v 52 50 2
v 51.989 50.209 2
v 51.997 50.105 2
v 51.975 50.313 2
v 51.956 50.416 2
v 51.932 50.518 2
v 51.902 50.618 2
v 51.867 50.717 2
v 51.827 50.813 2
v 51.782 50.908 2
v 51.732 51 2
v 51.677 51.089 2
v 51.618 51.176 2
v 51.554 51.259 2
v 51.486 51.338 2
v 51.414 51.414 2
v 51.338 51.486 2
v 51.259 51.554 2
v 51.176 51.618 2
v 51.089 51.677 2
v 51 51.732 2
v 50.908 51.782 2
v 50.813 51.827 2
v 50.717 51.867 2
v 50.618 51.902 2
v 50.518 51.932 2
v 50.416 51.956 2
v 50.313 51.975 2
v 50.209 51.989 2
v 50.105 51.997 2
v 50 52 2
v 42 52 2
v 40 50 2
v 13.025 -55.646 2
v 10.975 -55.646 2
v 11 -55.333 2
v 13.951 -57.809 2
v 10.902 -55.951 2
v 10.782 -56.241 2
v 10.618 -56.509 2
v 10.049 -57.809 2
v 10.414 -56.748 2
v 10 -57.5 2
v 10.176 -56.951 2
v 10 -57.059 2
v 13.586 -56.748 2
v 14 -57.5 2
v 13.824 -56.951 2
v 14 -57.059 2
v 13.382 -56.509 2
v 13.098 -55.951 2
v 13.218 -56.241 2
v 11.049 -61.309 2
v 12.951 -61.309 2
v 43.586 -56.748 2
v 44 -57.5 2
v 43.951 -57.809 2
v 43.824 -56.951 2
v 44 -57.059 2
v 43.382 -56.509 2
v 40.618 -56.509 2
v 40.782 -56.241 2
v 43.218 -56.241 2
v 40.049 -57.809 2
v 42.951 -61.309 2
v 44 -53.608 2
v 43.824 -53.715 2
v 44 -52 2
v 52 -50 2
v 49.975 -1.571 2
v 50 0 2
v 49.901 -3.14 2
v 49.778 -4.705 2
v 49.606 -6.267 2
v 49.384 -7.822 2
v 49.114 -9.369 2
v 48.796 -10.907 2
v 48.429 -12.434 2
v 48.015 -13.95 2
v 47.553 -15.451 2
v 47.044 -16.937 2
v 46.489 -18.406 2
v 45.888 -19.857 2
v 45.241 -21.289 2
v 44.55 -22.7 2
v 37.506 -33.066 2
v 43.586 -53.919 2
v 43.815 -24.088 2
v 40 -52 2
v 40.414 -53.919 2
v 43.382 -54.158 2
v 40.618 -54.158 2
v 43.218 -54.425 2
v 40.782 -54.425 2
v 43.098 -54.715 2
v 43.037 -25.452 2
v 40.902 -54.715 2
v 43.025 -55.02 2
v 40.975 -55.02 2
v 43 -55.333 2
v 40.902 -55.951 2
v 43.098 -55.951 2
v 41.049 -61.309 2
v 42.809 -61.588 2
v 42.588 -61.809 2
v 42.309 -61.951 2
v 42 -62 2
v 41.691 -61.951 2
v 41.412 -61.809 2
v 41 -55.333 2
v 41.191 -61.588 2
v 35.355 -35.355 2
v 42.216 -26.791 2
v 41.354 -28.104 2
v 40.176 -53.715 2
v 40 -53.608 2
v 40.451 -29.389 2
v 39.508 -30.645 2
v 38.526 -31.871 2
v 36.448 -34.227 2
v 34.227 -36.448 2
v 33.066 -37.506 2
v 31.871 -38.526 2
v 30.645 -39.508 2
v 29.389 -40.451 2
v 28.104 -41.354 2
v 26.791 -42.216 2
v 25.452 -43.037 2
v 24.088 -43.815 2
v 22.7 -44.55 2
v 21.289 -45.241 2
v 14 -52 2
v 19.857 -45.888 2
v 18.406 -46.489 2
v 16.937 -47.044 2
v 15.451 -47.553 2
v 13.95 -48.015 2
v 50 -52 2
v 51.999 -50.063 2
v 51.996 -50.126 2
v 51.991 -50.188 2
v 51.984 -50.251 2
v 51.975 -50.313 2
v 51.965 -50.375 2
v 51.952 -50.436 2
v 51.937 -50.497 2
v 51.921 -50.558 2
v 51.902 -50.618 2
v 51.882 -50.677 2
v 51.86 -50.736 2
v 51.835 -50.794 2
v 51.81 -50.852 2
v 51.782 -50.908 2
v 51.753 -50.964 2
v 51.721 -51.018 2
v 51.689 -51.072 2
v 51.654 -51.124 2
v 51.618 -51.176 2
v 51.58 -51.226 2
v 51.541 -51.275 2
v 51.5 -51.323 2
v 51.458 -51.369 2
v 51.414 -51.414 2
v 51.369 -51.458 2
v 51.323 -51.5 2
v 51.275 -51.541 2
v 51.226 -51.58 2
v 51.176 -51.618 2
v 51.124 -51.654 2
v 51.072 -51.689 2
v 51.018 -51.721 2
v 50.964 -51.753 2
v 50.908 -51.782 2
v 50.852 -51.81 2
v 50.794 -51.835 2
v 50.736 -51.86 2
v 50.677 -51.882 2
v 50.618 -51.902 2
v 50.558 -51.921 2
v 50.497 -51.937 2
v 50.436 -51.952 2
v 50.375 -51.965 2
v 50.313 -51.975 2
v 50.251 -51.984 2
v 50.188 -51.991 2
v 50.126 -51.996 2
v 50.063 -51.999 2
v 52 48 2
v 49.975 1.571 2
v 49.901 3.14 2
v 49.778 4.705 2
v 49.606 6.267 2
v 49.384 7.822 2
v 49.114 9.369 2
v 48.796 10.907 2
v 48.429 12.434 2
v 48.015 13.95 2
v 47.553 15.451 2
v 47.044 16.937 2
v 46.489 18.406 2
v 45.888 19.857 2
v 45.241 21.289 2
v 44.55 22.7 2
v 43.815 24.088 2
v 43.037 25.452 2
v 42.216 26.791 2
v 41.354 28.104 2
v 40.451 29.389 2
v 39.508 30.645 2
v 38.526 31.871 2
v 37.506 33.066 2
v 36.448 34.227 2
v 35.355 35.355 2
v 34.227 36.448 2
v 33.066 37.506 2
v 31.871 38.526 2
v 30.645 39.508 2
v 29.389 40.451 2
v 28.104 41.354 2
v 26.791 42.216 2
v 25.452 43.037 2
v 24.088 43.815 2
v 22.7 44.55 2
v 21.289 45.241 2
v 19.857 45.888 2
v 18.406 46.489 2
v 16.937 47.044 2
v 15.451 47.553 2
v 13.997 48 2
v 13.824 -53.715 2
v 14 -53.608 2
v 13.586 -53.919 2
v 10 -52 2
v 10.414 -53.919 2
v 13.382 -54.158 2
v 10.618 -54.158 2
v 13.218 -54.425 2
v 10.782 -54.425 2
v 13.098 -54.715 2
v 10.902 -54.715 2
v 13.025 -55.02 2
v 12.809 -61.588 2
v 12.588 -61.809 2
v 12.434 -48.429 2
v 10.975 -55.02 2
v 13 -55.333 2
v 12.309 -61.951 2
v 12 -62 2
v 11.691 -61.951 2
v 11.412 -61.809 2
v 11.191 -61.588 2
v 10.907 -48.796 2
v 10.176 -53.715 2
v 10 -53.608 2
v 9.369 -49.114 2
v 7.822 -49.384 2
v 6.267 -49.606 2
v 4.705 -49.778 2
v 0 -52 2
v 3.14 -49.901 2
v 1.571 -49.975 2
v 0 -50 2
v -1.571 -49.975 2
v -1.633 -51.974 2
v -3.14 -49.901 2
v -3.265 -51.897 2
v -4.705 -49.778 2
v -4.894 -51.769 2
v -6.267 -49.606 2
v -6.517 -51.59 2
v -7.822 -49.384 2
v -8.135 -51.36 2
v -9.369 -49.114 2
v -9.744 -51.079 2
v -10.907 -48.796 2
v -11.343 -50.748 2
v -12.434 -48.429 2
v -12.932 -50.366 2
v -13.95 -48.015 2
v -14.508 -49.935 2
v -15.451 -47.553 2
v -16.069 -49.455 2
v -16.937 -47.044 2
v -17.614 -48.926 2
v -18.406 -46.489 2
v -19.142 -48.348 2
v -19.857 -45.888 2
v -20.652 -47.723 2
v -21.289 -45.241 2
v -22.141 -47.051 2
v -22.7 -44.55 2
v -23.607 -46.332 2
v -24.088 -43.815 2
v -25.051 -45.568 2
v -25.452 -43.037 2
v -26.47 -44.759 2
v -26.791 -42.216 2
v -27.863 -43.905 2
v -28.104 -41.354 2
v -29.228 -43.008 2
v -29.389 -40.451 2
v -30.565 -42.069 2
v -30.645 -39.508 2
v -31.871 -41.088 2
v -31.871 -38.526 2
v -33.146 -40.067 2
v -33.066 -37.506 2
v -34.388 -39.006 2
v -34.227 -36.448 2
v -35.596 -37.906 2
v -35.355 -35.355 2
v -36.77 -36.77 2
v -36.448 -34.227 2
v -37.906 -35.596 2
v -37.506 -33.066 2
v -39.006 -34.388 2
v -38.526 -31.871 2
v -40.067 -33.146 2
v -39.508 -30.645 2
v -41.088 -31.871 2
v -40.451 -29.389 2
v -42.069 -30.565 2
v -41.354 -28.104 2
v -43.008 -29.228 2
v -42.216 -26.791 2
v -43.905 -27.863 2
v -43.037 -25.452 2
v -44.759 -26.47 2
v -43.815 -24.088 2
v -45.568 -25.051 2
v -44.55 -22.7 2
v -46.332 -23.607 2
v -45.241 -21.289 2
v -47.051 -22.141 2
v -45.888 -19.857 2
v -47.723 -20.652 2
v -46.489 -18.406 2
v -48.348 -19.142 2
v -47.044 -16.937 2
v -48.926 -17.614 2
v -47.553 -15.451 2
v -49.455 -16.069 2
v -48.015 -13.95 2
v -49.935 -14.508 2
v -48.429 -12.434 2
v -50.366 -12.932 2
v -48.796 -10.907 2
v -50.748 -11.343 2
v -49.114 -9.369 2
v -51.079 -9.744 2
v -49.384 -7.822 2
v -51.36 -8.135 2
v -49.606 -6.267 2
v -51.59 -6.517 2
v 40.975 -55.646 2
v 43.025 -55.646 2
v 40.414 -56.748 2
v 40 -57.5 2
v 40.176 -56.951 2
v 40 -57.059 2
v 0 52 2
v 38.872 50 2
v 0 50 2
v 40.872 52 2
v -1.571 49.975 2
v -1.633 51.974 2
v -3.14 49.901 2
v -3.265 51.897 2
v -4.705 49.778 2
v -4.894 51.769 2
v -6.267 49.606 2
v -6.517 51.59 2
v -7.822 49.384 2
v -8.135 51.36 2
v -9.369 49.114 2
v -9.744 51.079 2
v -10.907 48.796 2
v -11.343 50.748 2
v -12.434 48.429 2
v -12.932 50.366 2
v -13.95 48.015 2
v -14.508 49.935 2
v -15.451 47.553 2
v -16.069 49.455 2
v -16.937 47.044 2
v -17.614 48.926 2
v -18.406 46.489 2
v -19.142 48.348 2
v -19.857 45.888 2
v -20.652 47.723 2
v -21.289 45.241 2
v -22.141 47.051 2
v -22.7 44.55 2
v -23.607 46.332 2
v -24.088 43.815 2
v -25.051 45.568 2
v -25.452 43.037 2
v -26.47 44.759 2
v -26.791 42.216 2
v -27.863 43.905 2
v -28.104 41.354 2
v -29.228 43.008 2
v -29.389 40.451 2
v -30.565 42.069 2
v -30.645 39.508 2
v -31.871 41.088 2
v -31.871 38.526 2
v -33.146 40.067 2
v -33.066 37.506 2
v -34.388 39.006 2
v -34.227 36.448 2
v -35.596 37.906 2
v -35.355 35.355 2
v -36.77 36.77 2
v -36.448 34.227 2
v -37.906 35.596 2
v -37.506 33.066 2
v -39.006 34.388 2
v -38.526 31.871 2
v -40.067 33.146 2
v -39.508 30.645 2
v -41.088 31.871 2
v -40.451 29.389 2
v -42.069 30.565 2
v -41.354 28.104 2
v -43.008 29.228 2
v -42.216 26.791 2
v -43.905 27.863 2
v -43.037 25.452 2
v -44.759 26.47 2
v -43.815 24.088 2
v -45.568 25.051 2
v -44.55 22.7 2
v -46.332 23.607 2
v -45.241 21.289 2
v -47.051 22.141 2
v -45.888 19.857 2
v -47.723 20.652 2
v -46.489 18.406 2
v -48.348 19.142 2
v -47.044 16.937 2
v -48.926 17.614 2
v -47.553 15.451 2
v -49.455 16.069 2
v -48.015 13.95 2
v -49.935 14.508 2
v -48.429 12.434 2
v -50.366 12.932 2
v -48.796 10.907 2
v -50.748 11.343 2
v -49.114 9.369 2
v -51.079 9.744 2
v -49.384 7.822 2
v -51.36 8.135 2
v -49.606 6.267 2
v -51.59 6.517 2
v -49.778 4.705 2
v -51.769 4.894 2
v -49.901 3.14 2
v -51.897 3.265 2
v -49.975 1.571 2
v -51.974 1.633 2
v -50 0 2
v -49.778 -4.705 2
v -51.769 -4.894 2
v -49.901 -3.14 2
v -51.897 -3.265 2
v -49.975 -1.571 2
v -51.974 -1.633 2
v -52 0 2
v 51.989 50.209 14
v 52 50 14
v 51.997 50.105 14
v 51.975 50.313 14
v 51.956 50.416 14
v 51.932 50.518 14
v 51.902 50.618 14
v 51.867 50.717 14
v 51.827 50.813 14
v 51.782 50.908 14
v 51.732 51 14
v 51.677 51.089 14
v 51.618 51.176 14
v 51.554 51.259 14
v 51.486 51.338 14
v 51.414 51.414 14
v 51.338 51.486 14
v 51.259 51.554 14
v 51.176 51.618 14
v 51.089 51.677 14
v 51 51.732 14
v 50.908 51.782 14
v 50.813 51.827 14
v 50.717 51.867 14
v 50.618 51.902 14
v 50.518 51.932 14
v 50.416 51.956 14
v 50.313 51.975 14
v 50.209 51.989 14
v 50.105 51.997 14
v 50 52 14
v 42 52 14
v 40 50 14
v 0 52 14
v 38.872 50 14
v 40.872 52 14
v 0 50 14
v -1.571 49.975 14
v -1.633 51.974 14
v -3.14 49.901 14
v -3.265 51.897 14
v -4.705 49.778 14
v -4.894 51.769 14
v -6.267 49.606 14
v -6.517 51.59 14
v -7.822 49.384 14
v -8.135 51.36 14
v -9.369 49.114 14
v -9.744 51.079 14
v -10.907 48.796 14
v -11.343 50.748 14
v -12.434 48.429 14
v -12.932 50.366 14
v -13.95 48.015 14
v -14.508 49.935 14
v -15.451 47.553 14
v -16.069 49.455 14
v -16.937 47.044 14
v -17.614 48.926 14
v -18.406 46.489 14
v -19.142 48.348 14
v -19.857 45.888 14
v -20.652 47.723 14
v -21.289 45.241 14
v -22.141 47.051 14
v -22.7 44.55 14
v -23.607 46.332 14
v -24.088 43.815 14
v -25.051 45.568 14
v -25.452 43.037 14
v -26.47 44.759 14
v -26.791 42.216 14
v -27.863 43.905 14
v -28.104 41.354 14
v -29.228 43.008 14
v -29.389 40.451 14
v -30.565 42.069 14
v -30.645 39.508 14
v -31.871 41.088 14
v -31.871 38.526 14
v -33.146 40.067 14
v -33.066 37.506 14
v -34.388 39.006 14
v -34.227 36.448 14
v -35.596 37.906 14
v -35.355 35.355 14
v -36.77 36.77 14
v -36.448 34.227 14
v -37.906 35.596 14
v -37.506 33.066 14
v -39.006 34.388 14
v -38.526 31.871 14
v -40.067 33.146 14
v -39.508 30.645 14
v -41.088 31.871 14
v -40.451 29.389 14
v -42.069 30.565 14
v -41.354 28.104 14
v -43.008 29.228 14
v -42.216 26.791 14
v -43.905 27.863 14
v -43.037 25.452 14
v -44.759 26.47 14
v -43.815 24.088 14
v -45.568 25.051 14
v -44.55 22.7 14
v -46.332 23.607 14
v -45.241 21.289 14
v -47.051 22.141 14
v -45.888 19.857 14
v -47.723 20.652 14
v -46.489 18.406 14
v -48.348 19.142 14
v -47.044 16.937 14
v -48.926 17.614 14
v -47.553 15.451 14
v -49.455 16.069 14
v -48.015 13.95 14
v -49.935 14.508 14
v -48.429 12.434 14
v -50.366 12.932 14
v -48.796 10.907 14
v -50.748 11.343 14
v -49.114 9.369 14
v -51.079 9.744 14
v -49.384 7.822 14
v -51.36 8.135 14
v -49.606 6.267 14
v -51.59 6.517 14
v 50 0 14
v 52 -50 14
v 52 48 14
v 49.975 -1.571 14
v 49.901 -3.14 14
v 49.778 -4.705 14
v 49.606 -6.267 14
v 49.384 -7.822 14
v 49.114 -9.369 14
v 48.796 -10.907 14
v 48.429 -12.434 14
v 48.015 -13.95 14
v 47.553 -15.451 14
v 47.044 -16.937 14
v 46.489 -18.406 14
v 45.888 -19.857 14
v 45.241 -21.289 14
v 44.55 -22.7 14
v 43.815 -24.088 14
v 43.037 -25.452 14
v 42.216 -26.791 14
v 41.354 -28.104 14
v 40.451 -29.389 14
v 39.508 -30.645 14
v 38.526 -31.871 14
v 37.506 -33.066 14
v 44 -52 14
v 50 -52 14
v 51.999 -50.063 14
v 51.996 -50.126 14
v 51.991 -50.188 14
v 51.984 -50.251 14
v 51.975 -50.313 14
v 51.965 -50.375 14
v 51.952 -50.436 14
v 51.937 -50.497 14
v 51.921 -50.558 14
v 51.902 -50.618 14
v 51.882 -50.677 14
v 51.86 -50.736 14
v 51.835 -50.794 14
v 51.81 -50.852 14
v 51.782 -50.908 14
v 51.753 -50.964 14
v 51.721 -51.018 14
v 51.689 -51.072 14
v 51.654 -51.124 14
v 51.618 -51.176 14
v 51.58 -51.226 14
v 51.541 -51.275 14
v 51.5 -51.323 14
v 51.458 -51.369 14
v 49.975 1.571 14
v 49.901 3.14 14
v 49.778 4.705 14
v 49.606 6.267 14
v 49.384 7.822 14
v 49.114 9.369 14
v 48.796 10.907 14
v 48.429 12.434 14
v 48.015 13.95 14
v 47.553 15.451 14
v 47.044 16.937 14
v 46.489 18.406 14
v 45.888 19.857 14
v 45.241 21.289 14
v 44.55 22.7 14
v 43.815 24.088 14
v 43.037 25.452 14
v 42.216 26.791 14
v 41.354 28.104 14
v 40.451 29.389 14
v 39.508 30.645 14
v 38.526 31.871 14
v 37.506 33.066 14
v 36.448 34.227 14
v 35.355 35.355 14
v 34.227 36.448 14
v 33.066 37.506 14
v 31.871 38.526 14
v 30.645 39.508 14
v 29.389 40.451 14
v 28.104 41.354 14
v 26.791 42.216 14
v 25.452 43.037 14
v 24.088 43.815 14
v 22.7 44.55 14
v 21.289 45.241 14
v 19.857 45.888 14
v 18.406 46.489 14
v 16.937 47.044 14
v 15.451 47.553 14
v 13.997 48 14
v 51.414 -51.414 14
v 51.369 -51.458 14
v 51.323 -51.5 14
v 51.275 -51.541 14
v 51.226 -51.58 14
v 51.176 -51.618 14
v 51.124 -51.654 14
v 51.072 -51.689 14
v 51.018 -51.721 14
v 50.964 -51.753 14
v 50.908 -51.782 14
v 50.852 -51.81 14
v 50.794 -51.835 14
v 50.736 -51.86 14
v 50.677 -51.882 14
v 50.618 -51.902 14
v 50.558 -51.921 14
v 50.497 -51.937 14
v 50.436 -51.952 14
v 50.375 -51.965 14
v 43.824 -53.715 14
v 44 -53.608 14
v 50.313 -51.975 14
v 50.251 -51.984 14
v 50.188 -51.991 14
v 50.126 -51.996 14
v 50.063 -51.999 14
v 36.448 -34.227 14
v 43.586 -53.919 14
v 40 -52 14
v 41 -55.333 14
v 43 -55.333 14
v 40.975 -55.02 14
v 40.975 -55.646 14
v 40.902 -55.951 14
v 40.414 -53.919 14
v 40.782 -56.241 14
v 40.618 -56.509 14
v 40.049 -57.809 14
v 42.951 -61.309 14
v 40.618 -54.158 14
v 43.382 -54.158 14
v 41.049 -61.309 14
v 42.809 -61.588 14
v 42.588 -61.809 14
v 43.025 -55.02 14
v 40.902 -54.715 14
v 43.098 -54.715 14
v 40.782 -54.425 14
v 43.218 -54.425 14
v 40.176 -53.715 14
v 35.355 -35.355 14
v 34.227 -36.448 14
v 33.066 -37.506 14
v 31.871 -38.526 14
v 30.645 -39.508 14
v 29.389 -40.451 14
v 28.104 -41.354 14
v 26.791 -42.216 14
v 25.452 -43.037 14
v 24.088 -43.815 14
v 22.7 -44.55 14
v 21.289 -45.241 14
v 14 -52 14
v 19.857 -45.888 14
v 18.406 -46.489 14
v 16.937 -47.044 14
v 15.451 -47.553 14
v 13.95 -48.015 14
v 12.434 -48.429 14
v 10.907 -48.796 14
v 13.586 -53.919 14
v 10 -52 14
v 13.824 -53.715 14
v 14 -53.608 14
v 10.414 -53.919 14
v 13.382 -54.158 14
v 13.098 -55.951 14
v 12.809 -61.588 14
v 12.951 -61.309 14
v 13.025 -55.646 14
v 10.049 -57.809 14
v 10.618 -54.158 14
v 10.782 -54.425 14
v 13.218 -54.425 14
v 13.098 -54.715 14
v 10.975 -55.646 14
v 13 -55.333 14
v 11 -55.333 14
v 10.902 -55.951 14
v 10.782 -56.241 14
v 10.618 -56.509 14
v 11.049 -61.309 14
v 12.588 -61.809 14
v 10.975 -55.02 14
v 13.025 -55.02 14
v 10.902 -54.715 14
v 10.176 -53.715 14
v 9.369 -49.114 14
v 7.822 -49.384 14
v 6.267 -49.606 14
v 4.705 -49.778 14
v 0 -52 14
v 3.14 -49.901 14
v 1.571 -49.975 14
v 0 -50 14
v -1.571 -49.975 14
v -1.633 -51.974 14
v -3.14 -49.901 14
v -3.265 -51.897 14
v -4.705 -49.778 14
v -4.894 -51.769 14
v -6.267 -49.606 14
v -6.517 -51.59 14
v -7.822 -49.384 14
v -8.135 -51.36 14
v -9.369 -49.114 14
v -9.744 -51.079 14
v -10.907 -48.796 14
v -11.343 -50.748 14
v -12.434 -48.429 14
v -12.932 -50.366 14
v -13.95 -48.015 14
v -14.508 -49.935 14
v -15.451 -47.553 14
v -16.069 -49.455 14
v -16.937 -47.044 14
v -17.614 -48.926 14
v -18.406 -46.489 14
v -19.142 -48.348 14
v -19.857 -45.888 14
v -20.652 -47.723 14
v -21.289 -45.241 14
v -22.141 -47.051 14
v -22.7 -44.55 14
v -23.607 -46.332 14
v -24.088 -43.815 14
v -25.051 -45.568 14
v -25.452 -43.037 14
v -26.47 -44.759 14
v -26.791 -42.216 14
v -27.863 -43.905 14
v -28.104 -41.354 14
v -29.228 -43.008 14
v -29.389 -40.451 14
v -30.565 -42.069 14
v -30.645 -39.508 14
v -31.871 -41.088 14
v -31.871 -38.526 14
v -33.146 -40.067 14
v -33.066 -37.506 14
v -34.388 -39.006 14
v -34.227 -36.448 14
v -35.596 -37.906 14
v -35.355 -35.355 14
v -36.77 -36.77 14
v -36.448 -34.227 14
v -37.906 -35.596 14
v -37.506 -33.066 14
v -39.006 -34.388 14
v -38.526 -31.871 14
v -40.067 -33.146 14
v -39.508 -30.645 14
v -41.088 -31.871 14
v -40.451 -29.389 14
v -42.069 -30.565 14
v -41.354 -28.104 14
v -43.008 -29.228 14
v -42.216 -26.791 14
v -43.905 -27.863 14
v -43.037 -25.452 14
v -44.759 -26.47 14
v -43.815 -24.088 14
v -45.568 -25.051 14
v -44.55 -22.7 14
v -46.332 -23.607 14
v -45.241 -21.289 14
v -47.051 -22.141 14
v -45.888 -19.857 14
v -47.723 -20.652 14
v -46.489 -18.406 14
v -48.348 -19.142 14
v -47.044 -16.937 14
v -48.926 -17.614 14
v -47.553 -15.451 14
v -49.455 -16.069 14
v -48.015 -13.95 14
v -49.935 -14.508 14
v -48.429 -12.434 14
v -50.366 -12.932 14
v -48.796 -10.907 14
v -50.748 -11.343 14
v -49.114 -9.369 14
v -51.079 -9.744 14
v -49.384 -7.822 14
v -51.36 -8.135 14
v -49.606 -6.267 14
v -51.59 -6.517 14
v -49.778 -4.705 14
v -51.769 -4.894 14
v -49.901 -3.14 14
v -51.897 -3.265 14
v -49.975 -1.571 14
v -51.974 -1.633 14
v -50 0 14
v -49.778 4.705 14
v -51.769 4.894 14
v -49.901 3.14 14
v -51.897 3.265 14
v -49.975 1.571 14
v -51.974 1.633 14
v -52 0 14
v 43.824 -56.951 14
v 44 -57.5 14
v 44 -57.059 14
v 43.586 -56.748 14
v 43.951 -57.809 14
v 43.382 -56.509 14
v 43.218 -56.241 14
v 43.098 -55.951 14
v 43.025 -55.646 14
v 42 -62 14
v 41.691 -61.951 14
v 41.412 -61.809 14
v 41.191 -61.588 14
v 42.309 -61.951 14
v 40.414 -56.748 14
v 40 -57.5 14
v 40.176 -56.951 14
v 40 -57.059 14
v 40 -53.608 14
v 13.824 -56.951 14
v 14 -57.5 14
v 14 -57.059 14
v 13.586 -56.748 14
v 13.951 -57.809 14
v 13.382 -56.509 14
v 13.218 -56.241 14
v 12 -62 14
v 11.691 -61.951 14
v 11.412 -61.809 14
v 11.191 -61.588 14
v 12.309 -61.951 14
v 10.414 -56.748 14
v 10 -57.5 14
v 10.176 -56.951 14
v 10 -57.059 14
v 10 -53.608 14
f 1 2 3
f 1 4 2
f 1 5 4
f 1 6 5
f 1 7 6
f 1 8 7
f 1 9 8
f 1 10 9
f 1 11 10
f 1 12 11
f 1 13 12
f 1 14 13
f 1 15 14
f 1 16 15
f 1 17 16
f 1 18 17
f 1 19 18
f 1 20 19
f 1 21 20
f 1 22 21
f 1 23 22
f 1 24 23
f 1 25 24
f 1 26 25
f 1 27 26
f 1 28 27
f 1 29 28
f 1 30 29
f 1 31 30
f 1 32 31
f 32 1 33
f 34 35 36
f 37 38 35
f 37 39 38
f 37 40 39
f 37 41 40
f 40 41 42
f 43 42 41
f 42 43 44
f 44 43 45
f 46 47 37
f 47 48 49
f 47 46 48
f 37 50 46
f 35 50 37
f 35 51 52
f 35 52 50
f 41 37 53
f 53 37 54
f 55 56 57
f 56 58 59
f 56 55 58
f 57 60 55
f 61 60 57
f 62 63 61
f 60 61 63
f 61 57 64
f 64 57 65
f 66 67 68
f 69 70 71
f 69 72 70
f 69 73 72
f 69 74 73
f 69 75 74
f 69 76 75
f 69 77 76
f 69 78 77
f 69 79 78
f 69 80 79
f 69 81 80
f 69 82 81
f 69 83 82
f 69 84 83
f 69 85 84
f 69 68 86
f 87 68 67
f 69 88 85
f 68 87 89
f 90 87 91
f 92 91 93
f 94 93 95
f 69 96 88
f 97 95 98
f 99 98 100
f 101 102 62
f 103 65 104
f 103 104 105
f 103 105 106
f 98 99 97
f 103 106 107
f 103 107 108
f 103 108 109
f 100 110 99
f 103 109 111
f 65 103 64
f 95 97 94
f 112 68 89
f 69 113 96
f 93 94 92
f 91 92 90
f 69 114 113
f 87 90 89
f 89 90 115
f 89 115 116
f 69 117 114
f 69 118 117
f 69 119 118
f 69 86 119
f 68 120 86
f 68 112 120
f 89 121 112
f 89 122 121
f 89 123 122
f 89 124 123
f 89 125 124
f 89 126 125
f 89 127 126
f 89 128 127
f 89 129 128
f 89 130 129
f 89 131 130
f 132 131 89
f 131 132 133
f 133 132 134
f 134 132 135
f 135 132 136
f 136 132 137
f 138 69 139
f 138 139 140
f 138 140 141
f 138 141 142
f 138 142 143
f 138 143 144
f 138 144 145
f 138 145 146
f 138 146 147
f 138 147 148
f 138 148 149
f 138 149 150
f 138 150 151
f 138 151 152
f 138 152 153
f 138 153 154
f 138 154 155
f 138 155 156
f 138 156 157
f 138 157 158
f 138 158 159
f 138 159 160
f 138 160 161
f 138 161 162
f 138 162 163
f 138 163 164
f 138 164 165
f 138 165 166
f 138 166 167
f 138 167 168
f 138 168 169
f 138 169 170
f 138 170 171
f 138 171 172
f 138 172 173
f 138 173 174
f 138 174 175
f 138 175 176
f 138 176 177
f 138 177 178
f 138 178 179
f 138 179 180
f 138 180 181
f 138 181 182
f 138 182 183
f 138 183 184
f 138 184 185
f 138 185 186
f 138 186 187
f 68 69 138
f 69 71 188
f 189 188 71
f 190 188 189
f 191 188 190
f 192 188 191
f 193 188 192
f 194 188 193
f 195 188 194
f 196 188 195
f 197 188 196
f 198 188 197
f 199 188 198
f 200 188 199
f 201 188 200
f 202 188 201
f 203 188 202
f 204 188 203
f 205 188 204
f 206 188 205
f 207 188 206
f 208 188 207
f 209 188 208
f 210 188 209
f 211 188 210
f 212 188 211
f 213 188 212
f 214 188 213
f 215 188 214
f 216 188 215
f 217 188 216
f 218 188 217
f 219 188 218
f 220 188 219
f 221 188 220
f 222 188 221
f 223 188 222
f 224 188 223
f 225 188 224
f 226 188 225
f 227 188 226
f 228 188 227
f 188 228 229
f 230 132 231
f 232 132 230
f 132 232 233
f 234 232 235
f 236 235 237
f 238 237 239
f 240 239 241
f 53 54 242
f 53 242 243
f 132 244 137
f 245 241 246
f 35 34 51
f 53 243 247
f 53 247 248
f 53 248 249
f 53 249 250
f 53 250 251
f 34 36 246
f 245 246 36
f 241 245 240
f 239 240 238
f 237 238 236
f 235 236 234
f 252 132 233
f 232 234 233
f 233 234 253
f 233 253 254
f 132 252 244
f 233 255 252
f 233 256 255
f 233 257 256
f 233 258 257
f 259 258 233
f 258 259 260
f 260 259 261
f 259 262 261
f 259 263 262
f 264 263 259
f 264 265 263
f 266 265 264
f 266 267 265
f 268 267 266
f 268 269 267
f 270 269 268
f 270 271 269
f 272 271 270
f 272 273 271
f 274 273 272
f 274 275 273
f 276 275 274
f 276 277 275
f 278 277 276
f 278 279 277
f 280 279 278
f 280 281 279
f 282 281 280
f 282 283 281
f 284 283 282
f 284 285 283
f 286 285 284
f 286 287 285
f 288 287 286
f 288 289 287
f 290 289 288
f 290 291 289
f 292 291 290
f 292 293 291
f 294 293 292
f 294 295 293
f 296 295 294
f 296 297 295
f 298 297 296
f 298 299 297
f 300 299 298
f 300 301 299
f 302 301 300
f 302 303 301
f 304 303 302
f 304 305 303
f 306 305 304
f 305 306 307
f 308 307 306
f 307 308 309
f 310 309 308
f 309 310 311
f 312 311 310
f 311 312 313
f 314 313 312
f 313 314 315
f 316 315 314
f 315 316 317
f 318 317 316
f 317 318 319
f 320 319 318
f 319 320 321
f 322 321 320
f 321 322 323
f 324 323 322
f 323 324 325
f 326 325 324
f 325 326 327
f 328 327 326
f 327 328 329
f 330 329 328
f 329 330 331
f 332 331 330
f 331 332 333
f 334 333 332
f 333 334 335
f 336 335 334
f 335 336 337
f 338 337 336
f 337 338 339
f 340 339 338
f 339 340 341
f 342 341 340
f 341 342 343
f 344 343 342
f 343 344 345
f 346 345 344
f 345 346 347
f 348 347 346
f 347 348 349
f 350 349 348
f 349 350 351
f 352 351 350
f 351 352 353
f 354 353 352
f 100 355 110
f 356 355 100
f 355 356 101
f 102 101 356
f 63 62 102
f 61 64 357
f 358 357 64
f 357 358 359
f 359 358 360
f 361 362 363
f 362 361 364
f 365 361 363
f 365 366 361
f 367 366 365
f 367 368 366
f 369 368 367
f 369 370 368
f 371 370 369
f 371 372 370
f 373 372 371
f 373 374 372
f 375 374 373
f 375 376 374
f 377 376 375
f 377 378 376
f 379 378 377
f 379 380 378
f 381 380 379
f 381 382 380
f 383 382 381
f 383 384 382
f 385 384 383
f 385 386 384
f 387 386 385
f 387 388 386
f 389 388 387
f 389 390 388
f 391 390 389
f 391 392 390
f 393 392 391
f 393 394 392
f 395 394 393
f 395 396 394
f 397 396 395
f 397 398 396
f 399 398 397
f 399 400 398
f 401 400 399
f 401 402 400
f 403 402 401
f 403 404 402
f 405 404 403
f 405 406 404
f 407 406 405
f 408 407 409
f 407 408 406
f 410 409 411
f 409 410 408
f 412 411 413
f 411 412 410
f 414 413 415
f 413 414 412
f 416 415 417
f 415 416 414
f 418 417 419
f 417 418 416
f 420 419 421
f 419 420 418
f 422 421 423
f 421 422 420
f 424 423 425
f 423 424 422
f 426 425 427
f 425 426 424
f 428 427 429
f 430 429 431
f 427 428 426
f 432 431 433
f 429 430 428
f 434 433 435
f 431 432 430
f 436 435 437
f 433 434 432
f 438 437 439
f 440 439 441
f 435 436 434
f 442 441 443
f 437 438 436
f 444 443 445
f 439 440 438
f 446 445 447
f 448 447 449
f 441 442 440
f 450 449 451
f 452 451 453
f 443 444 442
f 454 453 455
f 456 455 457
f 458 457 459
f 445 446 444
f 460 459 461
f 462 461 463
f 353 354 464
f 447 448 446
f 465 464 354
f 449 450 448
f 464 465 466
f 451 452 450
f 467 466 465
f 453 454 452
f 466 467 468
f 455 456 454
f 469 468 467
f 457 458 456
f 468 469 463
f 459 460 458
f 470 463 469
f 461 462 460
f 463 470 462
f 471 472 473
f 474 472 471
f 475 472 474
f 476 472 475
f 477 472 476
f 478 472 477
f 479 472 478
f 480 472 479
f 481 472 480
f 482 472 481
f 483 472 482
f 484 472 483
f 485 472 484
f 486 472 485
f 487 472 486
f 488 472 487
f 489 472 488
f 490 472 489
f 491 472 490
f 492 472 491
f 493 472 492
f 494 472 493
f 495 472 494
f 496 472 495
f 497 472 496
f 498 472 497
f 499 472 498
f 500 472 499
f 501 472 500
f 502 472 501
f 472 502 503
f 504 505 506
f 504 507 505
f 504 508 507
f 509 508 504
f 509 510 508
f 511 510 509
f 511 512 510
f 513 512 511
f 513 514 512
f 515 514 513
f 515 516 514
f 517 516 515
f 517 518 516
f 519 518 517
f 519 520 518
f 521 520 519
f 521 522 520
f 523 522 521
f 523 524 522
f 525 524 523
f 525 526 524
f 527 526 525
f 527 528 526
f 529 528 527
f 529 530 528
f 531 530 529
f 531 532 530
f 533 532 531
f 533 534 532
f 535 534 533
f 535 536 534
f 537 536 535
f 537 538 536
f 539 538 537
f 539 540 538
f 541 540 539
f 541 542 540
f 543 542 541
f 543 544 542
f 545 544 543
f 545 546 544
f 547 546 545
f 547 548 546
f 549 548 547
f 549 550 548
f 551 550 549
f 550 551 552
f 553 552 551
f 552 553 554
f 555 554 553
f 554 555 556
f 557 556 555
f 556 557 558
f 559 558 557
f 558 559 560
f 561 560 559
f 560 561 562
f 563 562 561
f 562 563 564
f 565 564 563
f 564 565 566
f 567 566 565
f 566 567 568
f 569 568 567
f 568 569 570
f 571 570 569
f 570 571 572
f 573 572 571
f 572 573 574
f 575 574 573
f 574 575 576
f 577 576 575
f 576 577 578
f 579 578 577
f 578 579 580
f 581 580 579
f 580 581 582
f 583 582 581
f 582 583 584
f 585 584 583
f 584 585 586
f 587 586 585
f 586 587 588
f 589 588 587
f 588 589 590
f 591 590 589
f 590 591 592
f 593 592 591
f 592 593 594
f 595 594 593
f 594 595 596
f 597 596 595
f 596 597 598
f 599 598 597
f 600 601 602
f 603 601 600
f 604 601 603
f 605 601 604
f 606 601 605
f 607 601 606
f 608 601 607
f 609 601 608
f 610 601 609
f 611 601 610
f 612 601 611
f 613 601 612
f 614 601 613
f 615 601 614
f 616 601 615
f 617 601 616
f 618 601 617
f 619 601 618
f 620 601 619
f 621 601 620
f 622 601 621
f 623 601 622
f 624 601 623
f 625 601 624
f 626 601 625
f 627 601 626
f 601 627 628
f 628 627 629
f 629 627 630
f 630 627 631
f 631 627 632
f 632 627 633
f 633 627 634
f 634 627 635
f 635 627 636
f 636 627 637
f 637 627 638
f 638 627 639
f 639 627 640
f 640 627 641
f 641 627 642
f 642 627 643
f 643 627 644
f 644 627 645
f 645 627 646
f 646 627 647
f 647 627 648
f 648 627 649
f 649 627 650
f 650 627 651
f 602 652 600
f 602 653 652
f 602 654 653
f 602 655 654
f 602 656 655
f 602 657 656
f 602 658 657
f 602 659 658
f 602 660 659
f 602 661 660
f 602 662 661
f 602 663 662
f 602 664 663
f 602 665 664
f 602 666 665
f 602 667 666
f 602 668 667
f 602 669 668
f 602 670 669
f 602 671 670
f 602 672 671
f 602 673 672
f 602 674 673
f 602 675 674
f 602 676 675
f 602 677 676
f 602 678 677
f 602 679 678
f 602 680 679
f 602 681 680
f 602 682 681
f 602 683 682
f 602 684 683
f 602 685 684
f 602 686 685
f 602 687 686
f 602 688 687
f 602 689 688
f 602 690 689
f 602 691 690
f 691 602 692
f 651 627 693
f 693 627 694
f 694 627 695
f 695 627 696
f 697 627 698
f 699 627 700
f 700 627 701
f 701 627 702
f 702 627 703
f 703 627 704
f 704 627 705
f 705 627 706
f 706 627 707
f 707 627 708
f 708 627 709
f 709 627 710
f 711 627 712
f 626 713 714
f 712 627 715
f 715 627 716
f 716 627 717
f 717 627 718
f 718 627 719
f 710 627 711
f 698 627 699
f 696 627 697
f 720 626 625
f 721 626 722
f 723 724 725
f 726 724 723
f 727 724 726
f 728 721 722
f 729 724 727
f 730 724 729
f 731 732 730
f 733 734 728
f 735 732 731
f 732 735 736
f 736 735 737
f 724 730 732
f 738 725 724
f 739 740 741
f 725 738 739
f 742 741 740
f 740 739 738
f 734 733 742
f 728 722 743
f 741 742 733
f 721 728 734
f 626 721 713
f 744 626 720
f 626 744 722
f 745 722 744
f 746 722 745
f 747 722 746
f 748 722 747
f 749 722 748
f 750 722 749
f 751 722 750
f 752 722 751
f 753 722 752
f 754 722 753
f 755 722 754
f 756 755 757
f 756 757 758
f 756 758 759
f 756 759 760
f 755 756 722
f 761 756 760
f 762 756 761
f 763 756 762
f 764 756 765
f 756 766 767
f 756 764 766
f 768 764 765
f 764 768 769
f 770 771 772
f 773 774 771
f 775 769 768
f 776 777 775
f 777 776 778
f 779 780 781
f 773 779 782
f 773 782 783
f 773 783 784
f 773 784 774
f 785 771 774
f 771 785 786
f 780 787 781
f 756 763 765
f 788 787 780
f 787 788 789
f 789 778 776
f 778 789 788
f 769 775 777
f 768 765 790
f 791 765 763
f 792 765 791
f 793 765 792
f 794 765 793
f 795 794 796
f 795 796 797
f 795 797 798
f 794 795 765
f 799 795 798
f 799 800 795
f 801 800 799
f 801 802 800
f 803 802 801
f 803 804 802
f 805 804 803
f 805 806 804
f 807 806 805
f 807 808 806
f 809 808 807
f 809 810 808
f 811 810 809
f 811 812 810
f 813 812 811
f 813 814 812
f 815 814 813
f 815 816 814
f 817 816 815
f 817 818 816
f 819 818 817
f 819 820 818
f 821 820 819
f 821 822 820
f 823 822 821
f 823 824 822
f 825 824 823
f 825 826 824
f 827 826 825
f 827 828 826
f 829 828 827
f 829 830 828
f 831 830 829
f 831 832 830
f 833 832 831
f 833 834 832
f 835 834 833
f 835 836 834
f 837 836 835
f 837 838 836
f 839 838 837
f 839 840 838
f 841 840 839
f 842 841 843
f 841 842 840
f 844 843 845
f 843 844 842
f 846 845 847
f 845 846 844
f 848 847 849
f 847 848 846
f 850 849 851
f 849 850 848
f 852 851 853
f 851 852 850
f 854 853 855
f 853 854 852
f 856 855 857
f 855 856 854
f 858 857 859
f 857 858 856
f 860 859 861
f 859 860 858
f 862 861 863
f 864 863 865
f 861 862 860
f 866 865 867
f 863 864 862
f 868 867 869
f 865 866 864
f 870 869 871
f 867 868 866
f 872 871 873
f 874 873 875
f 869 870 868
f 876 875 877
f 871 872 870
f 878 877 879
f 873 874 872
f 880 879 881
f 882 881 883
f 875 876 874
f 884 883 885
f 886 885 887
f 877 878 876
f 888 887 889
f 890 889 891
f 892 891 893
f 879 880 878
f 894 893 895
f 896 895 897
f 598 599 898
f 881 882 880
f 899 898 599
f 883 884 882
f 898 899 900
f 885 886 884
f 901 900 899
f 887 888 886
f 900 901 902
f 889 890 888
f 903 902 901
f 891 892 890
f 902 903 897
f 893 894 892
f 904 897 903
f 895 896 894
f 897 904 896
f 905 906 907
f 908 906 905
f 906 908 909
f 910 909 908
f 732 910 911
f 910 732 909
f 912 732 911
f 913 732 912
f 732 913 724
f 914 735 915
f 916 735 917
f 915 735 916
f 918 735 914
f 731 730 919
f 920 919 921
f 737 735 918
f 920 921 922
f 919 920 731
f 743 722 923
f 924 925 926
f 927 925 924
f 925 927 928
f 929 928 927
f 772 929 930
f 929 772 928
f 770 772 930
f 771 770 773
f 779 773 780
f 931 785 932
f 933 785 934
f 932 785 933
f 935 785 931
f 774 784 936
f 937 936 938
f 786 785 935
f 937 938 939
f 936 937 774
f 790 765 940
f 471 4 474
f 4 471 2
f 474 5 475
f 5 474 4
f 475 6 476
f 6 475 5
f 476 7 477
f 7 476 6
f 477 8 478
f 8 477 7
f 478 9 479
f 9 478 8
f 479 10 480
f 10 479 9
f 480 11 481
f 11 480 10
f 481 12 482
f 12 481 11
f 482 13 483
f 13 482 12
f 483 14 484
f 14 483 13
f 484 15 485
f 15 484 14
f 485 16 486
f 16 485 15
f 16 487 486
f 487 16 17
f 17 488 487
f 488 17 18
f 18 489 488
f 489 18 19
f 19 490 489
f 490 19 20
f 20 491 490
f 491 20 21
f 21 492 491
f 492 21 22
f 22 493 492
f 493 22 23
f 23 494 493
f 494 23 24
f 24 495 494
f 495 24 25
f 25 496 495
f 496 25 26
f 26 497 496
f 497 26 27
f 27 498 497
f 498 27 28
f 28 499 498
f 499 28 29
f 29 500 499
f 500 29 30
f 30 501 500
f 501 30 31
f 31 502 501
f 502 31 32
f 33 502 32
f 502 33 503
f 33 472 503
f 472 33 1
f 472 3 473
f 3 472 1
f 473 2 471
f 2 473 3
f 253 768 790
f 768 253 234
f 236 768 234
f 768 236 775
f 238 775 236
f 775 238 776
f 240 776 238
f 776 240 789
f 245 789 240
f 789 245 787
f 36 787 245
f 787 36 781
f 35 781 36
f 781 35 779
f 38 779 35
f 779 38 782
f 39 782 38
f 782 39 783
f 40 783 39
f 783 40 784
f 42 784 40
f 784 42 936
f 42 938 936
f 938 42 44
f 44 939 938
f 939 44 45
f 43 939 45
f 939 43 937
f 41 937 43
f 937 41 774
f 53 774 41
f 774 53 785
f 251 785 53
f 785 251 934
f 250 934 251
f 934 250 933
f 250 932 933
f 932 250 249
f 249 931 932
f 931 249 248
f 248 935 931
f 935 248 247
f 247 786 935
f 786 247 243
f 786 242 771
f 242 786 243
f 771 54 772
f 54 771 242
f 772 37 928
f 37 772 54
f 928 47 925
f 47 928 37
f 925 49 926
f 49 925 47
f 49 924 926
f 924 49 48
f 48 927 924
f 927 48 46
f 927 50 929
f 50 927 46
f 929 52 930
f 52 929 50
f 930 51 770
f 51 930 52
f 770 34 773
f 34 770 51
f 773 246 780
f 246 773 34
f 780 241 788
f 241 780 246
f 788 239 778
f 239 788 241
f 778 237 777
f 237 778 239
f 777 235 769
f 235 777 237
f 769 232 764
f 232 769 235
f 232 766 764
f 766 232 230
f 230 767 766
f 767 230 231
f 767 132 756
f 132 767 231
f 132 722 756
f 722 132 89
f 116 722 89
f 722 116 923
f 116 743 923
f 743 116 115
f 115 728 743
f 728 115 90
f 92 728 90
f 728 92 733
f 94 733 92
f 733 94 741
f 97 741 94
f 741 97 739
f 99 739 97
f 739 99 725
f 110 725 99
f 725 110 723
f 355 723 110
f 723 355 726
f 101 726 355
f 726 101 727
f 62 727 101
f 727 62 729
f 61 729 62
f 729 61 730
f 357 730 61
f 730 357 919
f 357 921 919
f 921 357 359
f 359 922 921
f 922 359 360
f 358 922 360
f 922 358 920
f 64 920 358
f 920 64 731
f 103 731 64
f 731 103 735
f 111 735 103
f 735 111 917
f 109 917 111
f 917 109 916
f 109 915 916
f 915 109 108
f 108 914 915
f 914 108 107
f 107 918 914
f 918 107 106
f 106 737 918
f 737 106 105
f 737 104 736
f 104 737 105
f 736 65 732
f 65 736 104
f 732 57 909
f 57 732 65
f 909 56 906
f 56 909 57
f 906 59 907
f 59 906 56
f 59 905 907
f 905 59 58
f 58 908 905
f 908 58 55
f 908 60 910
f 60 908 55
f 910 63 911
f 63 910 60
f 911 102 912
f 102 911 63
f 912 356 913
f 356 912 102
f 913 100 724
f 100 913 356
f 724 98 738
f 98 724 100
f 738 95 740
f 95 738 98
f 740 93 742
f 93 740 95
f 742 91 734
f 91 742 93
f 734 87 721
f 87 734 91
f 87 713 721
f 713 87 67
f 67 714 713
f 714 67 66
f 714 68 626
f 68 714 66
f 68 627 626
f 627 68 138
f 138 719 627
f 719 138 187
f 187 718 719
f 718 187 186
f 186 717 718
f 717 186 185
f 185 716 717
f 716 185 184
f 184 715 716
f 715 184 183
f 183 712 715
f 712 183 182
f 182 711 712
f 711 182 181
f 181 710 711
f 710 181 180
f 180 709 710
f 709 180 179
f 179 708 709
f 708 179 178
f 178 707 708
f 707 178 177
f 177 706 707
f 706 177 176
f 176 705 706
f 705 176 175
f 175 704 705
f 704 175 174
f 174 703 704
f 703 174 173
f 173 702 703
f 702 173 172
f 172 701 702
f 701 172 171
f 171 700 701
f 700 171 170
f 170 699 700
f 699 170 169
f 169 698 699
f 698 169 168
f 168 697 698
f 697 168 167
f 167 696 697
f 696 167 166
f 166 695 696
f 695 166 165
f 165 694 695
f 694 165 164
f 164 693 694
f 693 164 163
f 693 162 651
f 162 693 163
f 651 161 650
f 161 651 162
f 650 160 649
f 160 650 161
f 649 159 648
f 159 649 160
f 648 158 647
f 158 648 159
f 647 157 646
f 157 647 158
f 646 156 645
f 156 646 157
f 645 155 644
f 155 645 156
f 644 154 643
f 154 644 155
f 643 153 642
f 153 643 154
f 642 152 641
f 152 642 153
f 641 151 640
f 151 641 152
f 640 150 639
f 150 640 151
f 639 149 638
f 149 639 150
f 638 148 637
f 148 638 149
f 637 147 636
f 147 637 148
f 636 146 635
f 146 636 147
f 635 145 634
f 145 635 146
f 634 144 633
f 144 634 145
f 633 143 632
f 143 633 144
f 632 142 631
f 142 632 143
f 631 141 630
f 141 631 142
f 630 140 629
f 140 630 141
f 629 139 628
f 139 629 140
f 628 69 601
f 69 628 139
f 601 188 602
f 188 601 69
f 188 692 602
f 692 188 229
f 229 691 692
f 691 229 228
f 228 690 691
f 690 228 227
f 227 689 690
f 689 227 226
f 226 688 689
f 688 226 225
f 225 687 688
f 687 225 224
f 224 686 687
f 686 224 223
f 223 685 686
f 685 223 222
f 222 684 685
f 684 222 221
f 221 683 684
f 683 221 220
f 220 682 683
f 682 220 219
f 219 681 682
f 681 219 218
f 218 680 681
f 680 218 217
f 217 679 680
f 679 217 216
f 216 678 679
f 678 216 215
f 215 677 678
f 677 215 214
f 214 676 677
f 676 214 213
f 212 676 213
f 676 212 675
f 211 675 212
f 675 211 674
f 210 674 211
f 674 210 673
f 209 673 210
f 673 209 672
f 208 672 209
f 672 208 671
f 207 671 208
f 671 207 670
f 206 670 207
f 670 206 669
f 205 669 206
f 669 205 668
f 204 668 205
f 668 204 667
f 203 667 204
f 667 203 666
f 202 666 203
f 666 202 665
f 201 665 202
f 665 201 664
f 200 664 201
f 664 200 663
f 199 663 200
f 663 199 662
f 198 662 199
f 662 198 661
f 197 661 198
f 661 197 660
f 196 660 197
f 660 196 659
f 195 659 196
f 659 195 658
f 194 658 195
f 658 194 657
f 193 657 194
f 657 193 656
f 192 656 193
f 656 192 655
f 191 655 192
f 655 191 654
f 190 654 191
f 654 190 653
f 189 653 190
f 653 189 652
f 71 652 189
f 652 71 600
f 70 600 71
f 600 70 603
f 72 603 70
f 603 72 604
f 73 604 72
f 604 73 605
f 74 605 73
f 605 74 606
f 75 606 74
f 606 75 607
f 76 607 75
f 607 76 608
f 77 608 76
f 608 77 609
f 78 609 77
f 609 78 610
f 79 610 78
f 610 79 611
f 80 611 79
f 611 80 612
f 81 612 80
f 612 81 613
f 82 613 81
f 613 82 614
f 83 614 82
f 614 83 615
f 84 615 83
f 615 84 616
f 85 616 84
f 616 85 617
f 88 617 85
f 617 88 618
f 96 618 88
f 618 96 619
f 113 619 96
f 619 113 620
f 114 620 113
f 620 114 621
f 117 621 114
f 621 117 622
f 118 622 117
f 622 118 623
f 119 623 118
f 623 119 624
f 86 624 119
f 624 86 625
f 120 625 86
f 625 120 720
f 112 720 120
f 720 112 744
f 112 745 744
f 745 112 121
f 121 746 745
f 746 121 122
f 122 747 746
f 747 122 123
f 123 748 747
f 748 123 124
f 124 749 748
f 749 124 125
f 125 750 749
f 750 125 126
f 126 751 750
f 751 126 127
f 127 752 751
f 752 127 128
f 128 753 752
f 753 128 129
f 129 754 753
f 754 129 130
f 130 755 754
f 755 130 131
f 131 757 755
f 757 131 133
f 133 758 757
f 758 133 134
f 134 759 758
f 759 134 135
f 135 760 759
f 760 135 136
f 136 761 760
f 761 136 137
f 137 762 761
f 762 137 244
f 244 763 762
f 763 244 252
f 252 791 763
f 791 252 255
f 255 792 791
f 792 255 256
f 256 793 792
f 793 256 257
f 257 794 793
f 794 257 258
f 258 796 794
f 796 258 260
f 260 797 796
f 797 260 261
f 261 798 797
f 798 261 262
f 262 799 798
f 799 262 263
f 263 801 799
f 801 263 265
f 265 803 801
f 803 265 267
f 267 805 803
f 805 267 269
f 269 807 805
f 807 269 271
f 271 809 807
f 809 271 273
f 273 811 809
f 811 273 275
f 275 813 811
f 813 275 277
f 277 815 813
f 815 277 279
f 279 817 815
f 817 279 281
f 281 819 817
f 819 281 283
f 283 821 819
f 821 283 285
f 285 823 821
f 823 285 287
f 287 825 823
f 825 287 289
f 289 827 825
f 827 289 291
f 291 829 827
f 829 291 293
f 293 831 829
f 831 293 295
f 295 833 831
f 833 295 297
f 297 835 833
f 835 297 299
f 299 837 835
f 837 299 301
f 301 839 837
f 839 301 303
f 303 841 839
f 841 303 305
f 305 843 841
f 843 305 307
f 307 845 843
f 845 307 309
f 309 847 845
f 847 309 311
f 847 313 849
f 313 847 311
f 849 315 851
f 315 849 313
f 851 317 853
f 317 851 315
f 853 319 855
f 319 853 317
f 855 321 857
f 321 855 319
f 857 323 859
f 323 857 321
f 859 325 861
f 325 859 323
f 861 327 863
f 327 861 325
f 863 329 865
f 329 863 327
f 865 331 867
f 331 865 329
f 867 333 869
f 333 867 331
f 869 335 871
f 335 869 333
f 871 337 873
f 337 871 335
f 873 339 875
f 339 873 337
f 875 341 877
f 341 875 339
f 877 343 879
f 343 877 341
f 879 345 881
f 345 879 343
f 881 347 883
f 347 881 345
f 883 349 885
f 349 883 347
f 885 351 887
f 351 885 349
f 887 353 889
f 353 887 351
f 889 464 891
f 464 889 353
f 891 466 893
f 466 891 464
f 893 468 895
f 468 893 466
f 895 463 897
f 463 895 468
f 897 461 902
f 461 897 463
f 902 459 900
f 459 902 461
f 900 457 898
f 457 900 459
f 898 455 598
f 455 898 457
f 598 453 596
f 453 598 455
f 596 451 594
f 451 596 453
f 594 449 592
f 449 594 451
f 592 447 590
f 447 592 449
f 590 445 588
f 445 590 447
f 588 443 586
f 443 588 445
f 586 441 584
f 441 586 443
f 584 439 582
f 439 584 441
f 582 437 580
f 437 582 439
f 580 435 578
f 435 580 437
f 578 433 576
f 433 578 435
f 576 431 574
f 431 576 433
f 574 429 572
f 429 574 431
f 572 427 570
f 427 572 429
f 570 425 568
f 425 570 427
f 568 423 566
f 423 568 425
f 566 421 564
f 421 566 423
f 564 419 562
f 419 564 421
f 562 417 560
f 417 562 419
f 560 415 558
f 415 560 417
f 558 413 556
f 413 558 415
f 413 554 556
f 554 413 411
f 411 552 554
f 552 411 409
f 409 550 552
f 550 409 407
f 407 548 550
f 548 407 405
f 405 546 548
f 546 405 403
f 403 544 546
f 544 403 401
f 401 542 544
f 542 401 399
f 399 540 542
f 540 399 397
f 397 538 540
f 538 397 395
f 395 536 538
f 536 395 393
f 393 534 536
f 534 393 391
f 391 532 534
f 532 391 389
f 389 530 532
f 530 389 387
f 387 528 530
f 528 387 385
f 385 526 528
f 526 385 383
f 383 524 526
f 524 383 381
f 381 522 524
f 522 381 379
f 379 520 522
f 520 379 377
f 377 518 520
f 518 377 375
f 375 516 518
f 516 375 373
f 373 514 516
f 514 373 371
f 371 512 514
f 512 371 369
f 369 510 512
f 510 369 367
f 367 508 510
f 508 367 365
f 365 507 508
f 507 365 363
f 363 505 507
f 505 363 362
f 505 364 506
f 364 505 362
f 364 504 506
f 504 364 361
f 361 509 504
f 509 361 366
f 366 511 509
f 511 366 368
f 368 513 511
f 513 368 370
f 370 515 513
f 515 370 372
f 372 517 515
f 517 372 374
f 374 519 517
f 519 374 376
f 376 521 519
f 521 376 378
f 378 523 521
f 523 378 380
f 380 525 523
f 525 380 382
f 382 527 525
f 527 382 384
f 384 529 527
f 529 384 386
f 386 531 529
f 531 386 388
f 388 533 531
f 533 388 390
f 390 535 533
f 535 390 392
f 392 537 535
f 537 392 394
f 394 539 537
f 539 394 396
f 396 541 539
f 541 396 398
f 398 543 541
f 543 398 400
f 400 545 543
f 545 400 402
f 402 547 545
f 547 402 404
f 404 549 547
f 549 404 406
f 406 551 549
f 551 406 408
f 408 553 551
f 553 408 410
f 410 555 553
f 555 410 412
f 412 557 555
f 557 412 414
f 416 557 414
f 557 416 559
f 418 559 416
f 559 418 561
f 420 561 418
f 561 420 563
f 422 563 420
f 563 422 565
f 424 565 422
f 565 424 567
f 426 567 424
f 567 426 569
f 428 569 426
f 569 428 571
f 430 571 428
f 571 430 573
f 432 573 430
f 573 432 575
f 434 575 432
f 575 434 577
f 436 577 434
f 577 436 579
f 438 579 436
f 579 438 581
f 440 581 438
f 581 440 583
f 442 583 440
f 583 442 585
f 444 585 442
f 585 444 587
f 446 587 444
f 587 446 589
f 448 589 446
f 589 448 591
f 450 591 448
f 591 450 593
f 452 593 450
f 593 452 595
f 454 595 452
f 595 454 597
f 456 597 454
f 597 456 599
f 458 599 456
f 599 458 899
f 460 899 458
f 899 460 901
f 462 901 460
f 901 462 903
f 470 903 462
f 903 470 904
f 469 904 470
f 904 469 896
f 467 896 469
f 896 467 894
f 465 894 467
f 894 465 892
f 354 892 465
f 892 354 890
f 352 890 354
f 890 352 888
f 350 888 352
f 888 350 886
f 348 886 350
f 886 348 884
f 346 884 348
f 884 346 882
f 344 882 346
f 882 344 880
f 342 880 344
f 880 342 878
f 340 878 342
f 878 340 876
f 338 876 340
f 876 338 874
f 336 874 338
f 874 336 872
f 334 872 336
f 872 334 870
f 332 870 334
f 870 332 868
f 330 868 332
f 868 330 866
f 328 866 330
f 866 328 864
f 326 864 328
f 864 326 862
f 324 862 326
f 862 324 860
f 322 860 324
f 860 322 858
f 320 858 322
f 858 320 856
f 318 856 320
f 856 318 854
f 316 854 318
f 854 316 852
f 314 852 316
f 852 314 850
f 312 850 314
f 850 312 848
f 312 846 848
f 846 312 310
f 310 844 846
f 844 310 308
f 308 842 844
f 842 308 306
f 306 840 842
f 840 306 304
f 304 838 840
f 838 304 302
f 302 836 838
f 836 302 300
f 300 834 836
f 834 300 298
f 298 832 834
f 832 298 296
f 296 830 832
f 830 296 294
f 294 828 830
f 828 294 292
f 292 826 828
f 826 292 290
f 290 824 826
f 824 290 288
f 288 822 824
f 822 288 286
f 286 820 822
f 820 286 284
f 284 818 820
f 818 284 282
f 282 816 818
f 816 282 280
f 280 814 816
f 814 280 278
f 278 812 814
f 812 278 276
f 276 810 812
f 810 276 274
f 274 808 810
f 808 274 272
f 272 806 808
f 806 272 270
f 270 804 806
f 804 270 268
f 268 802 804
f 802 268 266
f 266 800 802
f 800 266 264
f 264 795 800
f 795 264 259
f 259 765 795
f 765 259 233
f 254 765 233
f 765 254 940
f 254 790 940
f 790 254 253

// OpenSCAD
/*
User defined variables:
*/

cfgStripDiameter = 100;
cStripWidth = 10;
cStripThickness = 2;

//internal tweak variables
cWallThickness = 2;
cReflectorOffset = 10;
cReflectorHole = 0.8;
cFilletRadius=2;
cStripWidthClearance = 2;

cClampBiasFromFront = 10;
cClampsDistance = 30;

Square_size = cfgStripDiameter + cWallThickness*2;
//square(size = [Square_size,Square_size], center = true);
cFrontEdge = cfgStripDiameter/2 + cWallThickness;
cTopEdge = cfgStripDiameter/2 + cWallThickness;
cBottomEdge = -cTopEdge;

module base_internals() {
hull($fn=200) {
RadiusCenterOffset = Square_size/2 - cFilletRadius;
translate([RadiusCenterOffset,RadiusCenterOffset])
circle(r=cFilletRadius,$fn=120);
translate([RadiusCenterOffset,-RadiusCenterOffset])
circle(r=cFilletRadius);

circle(d=cfgStripDiameter+cWallThickness*2, $fn=200);
}    
}

//Clamp parameters
cClampRadius = 1;
cClampNeckRadius = 2;
cClampNeckWidth = 2;
cClampLength=10;
cClampWidth=4;
cClampHipOffset=cClampLength*0.55;
cClampNeckOffset=cClampLength*1/3;

module clamp_male_hull() {
    hull() {
    translate([0,-(cClampLength-cClampRadius)])
    circle(r=cClampRadius,$fn=20);
    HipX = cClampWidth/2-cClampRadius;
    translate([HipX,-cClampHipOffset])
    circle(r=cClampRadius,$fn=20);
    translate([-HipX,-cClampHipOffset])
    circle(r=cClampRadius,$fn=20);
    SquareH = 1;
    translate([-cClampWidth/2,-SquareH])
square(size = [cClampWidth,SquareH], center = false);
    }
}

module clamp_male_cutout() {
    XBias = cClampNeckWidth/2 + cClampNeckRadius;
    translate([XBias,-cClampNeckOffset])
    circle(r=cClampNeckRadius,$fn=40);
    translate([-XBias,-cClampNeckOffset])
    circle(r=cClampNeckRadius,$fn=40);
}
module clamp_male() {
difference() {
clamp_male_hull();
clamp_male_cutout();
}
}



module base() {
    base_internals();
    clamp1X = cFrontEdge-cClampBiasFromFront;
    clamp2X = clamp1X - cClampsDistance;
    translate([clamp1X,cBottomEdge])
    clamp_male();
    translate([clamp2X,cBottomEdge])
    clamp_male();
}



module main_cutouts() {
    stripCutTop = cTopEdge - cWallThickness;
    stripCutBottom = stripCutTop - cStripThickness;
    polygon( points=[[0,stripCutTop],[cFrontEdge,stripCutTop],[cFrontEdge,stripCutBottom],[0,stripCutBottom]]);
    
    circle(d=cfgStripDiameter,$fn=200);
    
    reflectorRightTopX = cFrontEdge - cReflectorOffset;
    reflectorLeftTopX = reflectorRightTopX - 1.41*cReflectorHole;
    reflectorRightBottomX = reflectorRightTopX - cWallThickness;
    reflectorLeftBottomX = reflectorLeftTopX - cWallThickness;
    reflectorTopY = cTopEdge;
    reflectorBottomY = cTopEdge - cWallThickness;
    polygon( points=[[reflectorLeftTopX,reflectorTopY],[reflectorRightTopX,reflectorTopY],[reflectorRightBottomX,reflectorBottomY],[reflectorLeftBottomX,reflectorBottomY]]);
}

module main() {
    difference() {
        base();
        main_cutouts();
    }
}

linear_extrude(height = cWallThickness)
base();
translate([0,0,cWallThickness])
linear_extrude(height = cStripWidth + cStripWidthClearance)
main();
